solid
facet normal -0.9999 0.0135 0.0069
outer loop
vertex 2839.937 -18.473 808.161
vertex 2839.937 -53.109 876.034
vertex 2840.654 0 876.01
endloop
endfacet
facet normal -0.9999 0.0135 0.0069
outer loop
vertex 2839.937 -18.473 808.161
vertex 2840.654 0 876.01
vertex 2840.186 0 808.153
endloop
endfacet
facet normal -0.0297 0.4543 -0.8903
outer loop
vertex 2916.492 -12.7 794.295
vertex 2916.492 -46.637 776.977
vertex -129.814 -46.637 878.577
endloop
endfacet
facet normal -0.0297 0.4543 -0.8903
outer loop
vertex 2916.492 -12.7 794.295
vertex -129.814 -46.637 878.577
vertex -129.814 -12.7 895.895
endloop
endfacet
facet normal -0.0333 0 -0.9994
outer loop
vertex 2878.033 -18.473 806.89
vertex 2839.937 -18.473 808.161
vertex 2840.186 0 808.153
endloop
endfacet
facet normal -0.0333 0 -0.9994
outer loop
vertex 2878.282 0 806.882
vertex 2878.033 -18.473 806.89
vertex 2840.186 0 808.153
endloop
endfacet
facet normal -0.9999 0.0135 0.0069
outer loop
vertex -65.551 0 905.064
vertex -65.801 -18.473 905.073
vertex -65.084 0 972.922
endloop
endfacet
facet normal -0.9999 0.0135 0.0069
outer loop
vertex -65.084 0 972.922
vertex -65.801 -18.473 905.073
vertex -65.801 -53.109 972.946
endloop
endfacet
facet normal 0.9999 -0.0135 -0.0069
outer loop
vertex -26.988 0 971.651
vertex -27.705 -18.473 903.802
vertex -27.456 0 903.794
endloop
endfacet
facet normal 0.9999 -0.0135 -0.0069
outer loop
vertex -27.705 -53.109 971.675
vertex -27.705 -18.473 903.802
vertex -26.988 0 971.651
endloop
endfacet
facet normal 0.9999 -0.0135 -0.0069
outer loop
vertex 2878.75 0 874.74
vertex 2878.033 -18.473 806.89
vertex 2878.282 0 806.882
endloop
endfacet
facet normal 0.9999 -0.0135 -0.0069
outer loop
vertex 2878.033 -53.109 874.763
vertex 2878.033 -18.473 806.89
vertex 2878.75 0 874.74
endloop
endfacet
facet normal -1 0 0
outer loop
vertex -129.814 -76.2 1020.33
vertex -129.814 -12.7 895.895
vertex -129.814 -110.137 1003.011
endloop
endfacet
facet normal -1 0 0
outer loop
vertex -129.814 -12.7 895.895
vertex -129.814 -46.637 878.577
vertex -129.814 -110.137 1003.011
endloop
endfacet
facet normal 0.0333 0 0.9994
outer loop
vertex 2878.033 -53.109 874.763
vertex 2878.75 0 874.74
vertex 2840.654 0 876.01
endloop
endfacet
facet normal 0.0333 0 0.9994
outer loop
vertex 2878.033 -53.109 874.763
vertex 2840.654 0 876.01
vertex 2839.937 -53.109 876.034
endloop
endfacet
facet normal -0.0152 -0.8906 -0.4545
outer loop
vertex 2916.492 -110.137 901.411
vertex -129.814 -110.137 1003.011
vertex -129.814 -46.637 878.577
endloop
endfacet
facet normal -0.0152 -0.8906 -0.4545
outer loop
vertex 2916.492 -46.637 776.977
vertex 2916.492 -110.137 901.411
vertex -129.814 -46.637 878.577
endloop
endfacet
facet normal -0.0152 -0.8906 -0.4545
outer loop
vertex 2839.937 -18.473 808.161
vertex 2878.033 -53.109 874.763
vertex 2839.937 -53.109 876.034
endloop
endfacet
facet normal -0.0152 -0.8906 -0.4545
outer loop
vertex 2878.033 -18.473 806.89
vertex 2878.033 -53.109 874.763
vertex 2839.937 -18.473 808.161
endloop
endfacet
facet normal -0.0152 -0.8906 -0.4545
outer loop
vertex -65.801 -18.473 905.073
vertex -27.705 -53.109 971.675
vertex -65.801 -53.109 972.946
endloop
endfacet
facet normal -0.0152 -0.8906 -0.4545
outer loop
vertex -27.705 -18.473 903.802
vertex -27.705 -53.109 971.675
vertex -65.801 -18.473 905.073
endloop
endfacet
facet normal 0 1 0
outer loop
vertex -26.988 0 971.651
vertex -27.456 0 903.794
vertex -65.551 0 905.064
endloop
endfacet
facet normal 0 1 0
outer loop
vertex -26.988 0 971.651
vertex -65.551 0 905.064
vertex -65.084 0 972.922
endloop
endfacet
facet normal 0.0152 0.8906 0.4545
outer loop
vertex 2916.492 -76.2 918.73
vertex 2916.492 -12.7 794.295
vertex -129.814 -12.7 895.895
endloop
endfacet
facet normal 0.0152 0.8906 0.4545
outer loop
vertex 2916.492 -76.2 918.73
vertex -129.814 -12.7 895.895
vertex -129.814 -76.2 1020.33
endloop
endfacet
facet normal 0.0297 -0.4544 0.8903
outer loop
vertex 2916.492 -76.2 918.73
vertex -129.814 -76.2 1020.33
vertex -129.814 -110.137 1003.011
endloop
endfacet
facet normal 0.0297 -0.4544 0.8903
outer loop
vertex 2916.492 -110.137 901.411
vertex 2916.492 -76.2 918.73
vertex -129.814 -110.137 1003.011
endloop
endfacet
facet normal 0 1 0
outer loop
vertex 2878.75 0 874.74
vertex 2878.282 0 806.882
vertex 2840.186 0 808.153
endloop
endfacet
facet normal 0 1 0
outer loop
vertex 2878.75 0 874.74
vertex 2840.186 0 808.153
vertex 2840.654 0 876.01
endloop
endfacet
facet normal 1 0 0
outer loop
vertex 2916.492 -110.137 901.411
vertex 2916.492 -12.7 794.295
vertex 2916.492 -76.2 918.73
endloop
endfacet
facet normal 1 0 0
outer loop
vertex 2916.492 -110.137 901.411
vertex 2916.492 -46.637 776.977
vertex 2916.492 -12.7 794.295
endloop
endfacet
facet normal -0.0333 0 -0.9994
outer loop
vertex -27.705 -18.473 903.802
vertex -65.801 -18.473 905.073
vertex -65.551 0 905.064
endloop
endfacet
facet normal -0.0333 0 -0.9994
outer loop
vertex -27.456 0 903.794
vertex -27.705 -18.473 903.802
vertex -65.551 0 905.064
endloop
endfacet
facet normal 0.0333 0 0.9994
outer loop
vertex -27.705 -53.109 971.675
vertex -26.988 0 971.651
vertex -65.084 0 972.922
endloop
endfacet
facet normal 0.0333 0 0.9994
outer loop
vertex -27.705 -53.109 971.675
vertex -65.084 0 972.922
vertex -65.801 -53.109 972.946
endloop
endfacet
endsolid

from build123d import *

# Parameters (mm, degrees)
F5_W     = 59.0129865401
F5_H     = 254
F5_W_2   = 276.4360010624
F5_H_2   = 464.4125699997
F6_DEPTH = 127


with BuildPart() as f2:
    # F2: sweep along a path in F0
    with BuildLine(Plane.XZ) as f2_path:
        Line((-129.8137740847, 1016), (2916.4924219501, 914.4))
    # F1 (on Right) → F2 (sweep)
    with BuildSketch(Plane.YZ):
        Polygon((-12.7, 891.5659210666), (-76.2, 1016), (-110.1365669818, 998.6818181818), (-46.6365669818, 874.2477392484), align=None)
    sweep(path=f2_path.line)


with BuildPart() as f4:
    # F4: sweep along a path in F0
    with BuildLine(Plane.XZ) as f4_path:
        Line((-129.8137740847, 1016), (2916.4924219501, 914.4))
    # F3 (on Right) → F4 (sweep)
    with BuildSketch(Plane.YZ):
        Polygon((0, 970.7512440242), (-53.1090909091, 970.7512440242), (-18.4727272727, 902.8781100606), (0, 902.8781100606), align=None)
    sweep(path=f4_path.line)

    # F5 (on face) → F6 (cut)
    with BuildSketch(Plane(origin=(5.9708109288, 350.8155029635, 179.0247866914), x_dir=(-0.9998851079, 0.0135017638, 0.00689009), z_dir=(0.0151581979, 0.8906212057, 0.4544932309))):
        with Locations((-2901.8983019364, 727.1129241549)):
            Rectangle(F5_W, F5_H)
        Polygon((-953.1969428062, 1159.2264175415), (-953.1969428062, 970.5620119603), (-1936.9811249375, 970.5620119603), (-2834.2918086663, 970.5620119603), (-2834.2918086663, 698.6254103649), (-1936.9811249375, 698.6254103649), (-1936.9811249375, 705.0999578878), (-953.1969428062, 705.0999578878), (-953.1969428062, 421.1422204971), (33.6796157062, 421.1422204971), (33.6796157062, 1159.2264175415), align=None)
        with Locations((209.9976162374, 857.911169529)):
            Rectangle(F5_W_2, F5_H_2)
    extrude(amount=F6_DEPTH, mode=Mode.SUBTRACT)


solid = Compound([f2.part, f4.part])
